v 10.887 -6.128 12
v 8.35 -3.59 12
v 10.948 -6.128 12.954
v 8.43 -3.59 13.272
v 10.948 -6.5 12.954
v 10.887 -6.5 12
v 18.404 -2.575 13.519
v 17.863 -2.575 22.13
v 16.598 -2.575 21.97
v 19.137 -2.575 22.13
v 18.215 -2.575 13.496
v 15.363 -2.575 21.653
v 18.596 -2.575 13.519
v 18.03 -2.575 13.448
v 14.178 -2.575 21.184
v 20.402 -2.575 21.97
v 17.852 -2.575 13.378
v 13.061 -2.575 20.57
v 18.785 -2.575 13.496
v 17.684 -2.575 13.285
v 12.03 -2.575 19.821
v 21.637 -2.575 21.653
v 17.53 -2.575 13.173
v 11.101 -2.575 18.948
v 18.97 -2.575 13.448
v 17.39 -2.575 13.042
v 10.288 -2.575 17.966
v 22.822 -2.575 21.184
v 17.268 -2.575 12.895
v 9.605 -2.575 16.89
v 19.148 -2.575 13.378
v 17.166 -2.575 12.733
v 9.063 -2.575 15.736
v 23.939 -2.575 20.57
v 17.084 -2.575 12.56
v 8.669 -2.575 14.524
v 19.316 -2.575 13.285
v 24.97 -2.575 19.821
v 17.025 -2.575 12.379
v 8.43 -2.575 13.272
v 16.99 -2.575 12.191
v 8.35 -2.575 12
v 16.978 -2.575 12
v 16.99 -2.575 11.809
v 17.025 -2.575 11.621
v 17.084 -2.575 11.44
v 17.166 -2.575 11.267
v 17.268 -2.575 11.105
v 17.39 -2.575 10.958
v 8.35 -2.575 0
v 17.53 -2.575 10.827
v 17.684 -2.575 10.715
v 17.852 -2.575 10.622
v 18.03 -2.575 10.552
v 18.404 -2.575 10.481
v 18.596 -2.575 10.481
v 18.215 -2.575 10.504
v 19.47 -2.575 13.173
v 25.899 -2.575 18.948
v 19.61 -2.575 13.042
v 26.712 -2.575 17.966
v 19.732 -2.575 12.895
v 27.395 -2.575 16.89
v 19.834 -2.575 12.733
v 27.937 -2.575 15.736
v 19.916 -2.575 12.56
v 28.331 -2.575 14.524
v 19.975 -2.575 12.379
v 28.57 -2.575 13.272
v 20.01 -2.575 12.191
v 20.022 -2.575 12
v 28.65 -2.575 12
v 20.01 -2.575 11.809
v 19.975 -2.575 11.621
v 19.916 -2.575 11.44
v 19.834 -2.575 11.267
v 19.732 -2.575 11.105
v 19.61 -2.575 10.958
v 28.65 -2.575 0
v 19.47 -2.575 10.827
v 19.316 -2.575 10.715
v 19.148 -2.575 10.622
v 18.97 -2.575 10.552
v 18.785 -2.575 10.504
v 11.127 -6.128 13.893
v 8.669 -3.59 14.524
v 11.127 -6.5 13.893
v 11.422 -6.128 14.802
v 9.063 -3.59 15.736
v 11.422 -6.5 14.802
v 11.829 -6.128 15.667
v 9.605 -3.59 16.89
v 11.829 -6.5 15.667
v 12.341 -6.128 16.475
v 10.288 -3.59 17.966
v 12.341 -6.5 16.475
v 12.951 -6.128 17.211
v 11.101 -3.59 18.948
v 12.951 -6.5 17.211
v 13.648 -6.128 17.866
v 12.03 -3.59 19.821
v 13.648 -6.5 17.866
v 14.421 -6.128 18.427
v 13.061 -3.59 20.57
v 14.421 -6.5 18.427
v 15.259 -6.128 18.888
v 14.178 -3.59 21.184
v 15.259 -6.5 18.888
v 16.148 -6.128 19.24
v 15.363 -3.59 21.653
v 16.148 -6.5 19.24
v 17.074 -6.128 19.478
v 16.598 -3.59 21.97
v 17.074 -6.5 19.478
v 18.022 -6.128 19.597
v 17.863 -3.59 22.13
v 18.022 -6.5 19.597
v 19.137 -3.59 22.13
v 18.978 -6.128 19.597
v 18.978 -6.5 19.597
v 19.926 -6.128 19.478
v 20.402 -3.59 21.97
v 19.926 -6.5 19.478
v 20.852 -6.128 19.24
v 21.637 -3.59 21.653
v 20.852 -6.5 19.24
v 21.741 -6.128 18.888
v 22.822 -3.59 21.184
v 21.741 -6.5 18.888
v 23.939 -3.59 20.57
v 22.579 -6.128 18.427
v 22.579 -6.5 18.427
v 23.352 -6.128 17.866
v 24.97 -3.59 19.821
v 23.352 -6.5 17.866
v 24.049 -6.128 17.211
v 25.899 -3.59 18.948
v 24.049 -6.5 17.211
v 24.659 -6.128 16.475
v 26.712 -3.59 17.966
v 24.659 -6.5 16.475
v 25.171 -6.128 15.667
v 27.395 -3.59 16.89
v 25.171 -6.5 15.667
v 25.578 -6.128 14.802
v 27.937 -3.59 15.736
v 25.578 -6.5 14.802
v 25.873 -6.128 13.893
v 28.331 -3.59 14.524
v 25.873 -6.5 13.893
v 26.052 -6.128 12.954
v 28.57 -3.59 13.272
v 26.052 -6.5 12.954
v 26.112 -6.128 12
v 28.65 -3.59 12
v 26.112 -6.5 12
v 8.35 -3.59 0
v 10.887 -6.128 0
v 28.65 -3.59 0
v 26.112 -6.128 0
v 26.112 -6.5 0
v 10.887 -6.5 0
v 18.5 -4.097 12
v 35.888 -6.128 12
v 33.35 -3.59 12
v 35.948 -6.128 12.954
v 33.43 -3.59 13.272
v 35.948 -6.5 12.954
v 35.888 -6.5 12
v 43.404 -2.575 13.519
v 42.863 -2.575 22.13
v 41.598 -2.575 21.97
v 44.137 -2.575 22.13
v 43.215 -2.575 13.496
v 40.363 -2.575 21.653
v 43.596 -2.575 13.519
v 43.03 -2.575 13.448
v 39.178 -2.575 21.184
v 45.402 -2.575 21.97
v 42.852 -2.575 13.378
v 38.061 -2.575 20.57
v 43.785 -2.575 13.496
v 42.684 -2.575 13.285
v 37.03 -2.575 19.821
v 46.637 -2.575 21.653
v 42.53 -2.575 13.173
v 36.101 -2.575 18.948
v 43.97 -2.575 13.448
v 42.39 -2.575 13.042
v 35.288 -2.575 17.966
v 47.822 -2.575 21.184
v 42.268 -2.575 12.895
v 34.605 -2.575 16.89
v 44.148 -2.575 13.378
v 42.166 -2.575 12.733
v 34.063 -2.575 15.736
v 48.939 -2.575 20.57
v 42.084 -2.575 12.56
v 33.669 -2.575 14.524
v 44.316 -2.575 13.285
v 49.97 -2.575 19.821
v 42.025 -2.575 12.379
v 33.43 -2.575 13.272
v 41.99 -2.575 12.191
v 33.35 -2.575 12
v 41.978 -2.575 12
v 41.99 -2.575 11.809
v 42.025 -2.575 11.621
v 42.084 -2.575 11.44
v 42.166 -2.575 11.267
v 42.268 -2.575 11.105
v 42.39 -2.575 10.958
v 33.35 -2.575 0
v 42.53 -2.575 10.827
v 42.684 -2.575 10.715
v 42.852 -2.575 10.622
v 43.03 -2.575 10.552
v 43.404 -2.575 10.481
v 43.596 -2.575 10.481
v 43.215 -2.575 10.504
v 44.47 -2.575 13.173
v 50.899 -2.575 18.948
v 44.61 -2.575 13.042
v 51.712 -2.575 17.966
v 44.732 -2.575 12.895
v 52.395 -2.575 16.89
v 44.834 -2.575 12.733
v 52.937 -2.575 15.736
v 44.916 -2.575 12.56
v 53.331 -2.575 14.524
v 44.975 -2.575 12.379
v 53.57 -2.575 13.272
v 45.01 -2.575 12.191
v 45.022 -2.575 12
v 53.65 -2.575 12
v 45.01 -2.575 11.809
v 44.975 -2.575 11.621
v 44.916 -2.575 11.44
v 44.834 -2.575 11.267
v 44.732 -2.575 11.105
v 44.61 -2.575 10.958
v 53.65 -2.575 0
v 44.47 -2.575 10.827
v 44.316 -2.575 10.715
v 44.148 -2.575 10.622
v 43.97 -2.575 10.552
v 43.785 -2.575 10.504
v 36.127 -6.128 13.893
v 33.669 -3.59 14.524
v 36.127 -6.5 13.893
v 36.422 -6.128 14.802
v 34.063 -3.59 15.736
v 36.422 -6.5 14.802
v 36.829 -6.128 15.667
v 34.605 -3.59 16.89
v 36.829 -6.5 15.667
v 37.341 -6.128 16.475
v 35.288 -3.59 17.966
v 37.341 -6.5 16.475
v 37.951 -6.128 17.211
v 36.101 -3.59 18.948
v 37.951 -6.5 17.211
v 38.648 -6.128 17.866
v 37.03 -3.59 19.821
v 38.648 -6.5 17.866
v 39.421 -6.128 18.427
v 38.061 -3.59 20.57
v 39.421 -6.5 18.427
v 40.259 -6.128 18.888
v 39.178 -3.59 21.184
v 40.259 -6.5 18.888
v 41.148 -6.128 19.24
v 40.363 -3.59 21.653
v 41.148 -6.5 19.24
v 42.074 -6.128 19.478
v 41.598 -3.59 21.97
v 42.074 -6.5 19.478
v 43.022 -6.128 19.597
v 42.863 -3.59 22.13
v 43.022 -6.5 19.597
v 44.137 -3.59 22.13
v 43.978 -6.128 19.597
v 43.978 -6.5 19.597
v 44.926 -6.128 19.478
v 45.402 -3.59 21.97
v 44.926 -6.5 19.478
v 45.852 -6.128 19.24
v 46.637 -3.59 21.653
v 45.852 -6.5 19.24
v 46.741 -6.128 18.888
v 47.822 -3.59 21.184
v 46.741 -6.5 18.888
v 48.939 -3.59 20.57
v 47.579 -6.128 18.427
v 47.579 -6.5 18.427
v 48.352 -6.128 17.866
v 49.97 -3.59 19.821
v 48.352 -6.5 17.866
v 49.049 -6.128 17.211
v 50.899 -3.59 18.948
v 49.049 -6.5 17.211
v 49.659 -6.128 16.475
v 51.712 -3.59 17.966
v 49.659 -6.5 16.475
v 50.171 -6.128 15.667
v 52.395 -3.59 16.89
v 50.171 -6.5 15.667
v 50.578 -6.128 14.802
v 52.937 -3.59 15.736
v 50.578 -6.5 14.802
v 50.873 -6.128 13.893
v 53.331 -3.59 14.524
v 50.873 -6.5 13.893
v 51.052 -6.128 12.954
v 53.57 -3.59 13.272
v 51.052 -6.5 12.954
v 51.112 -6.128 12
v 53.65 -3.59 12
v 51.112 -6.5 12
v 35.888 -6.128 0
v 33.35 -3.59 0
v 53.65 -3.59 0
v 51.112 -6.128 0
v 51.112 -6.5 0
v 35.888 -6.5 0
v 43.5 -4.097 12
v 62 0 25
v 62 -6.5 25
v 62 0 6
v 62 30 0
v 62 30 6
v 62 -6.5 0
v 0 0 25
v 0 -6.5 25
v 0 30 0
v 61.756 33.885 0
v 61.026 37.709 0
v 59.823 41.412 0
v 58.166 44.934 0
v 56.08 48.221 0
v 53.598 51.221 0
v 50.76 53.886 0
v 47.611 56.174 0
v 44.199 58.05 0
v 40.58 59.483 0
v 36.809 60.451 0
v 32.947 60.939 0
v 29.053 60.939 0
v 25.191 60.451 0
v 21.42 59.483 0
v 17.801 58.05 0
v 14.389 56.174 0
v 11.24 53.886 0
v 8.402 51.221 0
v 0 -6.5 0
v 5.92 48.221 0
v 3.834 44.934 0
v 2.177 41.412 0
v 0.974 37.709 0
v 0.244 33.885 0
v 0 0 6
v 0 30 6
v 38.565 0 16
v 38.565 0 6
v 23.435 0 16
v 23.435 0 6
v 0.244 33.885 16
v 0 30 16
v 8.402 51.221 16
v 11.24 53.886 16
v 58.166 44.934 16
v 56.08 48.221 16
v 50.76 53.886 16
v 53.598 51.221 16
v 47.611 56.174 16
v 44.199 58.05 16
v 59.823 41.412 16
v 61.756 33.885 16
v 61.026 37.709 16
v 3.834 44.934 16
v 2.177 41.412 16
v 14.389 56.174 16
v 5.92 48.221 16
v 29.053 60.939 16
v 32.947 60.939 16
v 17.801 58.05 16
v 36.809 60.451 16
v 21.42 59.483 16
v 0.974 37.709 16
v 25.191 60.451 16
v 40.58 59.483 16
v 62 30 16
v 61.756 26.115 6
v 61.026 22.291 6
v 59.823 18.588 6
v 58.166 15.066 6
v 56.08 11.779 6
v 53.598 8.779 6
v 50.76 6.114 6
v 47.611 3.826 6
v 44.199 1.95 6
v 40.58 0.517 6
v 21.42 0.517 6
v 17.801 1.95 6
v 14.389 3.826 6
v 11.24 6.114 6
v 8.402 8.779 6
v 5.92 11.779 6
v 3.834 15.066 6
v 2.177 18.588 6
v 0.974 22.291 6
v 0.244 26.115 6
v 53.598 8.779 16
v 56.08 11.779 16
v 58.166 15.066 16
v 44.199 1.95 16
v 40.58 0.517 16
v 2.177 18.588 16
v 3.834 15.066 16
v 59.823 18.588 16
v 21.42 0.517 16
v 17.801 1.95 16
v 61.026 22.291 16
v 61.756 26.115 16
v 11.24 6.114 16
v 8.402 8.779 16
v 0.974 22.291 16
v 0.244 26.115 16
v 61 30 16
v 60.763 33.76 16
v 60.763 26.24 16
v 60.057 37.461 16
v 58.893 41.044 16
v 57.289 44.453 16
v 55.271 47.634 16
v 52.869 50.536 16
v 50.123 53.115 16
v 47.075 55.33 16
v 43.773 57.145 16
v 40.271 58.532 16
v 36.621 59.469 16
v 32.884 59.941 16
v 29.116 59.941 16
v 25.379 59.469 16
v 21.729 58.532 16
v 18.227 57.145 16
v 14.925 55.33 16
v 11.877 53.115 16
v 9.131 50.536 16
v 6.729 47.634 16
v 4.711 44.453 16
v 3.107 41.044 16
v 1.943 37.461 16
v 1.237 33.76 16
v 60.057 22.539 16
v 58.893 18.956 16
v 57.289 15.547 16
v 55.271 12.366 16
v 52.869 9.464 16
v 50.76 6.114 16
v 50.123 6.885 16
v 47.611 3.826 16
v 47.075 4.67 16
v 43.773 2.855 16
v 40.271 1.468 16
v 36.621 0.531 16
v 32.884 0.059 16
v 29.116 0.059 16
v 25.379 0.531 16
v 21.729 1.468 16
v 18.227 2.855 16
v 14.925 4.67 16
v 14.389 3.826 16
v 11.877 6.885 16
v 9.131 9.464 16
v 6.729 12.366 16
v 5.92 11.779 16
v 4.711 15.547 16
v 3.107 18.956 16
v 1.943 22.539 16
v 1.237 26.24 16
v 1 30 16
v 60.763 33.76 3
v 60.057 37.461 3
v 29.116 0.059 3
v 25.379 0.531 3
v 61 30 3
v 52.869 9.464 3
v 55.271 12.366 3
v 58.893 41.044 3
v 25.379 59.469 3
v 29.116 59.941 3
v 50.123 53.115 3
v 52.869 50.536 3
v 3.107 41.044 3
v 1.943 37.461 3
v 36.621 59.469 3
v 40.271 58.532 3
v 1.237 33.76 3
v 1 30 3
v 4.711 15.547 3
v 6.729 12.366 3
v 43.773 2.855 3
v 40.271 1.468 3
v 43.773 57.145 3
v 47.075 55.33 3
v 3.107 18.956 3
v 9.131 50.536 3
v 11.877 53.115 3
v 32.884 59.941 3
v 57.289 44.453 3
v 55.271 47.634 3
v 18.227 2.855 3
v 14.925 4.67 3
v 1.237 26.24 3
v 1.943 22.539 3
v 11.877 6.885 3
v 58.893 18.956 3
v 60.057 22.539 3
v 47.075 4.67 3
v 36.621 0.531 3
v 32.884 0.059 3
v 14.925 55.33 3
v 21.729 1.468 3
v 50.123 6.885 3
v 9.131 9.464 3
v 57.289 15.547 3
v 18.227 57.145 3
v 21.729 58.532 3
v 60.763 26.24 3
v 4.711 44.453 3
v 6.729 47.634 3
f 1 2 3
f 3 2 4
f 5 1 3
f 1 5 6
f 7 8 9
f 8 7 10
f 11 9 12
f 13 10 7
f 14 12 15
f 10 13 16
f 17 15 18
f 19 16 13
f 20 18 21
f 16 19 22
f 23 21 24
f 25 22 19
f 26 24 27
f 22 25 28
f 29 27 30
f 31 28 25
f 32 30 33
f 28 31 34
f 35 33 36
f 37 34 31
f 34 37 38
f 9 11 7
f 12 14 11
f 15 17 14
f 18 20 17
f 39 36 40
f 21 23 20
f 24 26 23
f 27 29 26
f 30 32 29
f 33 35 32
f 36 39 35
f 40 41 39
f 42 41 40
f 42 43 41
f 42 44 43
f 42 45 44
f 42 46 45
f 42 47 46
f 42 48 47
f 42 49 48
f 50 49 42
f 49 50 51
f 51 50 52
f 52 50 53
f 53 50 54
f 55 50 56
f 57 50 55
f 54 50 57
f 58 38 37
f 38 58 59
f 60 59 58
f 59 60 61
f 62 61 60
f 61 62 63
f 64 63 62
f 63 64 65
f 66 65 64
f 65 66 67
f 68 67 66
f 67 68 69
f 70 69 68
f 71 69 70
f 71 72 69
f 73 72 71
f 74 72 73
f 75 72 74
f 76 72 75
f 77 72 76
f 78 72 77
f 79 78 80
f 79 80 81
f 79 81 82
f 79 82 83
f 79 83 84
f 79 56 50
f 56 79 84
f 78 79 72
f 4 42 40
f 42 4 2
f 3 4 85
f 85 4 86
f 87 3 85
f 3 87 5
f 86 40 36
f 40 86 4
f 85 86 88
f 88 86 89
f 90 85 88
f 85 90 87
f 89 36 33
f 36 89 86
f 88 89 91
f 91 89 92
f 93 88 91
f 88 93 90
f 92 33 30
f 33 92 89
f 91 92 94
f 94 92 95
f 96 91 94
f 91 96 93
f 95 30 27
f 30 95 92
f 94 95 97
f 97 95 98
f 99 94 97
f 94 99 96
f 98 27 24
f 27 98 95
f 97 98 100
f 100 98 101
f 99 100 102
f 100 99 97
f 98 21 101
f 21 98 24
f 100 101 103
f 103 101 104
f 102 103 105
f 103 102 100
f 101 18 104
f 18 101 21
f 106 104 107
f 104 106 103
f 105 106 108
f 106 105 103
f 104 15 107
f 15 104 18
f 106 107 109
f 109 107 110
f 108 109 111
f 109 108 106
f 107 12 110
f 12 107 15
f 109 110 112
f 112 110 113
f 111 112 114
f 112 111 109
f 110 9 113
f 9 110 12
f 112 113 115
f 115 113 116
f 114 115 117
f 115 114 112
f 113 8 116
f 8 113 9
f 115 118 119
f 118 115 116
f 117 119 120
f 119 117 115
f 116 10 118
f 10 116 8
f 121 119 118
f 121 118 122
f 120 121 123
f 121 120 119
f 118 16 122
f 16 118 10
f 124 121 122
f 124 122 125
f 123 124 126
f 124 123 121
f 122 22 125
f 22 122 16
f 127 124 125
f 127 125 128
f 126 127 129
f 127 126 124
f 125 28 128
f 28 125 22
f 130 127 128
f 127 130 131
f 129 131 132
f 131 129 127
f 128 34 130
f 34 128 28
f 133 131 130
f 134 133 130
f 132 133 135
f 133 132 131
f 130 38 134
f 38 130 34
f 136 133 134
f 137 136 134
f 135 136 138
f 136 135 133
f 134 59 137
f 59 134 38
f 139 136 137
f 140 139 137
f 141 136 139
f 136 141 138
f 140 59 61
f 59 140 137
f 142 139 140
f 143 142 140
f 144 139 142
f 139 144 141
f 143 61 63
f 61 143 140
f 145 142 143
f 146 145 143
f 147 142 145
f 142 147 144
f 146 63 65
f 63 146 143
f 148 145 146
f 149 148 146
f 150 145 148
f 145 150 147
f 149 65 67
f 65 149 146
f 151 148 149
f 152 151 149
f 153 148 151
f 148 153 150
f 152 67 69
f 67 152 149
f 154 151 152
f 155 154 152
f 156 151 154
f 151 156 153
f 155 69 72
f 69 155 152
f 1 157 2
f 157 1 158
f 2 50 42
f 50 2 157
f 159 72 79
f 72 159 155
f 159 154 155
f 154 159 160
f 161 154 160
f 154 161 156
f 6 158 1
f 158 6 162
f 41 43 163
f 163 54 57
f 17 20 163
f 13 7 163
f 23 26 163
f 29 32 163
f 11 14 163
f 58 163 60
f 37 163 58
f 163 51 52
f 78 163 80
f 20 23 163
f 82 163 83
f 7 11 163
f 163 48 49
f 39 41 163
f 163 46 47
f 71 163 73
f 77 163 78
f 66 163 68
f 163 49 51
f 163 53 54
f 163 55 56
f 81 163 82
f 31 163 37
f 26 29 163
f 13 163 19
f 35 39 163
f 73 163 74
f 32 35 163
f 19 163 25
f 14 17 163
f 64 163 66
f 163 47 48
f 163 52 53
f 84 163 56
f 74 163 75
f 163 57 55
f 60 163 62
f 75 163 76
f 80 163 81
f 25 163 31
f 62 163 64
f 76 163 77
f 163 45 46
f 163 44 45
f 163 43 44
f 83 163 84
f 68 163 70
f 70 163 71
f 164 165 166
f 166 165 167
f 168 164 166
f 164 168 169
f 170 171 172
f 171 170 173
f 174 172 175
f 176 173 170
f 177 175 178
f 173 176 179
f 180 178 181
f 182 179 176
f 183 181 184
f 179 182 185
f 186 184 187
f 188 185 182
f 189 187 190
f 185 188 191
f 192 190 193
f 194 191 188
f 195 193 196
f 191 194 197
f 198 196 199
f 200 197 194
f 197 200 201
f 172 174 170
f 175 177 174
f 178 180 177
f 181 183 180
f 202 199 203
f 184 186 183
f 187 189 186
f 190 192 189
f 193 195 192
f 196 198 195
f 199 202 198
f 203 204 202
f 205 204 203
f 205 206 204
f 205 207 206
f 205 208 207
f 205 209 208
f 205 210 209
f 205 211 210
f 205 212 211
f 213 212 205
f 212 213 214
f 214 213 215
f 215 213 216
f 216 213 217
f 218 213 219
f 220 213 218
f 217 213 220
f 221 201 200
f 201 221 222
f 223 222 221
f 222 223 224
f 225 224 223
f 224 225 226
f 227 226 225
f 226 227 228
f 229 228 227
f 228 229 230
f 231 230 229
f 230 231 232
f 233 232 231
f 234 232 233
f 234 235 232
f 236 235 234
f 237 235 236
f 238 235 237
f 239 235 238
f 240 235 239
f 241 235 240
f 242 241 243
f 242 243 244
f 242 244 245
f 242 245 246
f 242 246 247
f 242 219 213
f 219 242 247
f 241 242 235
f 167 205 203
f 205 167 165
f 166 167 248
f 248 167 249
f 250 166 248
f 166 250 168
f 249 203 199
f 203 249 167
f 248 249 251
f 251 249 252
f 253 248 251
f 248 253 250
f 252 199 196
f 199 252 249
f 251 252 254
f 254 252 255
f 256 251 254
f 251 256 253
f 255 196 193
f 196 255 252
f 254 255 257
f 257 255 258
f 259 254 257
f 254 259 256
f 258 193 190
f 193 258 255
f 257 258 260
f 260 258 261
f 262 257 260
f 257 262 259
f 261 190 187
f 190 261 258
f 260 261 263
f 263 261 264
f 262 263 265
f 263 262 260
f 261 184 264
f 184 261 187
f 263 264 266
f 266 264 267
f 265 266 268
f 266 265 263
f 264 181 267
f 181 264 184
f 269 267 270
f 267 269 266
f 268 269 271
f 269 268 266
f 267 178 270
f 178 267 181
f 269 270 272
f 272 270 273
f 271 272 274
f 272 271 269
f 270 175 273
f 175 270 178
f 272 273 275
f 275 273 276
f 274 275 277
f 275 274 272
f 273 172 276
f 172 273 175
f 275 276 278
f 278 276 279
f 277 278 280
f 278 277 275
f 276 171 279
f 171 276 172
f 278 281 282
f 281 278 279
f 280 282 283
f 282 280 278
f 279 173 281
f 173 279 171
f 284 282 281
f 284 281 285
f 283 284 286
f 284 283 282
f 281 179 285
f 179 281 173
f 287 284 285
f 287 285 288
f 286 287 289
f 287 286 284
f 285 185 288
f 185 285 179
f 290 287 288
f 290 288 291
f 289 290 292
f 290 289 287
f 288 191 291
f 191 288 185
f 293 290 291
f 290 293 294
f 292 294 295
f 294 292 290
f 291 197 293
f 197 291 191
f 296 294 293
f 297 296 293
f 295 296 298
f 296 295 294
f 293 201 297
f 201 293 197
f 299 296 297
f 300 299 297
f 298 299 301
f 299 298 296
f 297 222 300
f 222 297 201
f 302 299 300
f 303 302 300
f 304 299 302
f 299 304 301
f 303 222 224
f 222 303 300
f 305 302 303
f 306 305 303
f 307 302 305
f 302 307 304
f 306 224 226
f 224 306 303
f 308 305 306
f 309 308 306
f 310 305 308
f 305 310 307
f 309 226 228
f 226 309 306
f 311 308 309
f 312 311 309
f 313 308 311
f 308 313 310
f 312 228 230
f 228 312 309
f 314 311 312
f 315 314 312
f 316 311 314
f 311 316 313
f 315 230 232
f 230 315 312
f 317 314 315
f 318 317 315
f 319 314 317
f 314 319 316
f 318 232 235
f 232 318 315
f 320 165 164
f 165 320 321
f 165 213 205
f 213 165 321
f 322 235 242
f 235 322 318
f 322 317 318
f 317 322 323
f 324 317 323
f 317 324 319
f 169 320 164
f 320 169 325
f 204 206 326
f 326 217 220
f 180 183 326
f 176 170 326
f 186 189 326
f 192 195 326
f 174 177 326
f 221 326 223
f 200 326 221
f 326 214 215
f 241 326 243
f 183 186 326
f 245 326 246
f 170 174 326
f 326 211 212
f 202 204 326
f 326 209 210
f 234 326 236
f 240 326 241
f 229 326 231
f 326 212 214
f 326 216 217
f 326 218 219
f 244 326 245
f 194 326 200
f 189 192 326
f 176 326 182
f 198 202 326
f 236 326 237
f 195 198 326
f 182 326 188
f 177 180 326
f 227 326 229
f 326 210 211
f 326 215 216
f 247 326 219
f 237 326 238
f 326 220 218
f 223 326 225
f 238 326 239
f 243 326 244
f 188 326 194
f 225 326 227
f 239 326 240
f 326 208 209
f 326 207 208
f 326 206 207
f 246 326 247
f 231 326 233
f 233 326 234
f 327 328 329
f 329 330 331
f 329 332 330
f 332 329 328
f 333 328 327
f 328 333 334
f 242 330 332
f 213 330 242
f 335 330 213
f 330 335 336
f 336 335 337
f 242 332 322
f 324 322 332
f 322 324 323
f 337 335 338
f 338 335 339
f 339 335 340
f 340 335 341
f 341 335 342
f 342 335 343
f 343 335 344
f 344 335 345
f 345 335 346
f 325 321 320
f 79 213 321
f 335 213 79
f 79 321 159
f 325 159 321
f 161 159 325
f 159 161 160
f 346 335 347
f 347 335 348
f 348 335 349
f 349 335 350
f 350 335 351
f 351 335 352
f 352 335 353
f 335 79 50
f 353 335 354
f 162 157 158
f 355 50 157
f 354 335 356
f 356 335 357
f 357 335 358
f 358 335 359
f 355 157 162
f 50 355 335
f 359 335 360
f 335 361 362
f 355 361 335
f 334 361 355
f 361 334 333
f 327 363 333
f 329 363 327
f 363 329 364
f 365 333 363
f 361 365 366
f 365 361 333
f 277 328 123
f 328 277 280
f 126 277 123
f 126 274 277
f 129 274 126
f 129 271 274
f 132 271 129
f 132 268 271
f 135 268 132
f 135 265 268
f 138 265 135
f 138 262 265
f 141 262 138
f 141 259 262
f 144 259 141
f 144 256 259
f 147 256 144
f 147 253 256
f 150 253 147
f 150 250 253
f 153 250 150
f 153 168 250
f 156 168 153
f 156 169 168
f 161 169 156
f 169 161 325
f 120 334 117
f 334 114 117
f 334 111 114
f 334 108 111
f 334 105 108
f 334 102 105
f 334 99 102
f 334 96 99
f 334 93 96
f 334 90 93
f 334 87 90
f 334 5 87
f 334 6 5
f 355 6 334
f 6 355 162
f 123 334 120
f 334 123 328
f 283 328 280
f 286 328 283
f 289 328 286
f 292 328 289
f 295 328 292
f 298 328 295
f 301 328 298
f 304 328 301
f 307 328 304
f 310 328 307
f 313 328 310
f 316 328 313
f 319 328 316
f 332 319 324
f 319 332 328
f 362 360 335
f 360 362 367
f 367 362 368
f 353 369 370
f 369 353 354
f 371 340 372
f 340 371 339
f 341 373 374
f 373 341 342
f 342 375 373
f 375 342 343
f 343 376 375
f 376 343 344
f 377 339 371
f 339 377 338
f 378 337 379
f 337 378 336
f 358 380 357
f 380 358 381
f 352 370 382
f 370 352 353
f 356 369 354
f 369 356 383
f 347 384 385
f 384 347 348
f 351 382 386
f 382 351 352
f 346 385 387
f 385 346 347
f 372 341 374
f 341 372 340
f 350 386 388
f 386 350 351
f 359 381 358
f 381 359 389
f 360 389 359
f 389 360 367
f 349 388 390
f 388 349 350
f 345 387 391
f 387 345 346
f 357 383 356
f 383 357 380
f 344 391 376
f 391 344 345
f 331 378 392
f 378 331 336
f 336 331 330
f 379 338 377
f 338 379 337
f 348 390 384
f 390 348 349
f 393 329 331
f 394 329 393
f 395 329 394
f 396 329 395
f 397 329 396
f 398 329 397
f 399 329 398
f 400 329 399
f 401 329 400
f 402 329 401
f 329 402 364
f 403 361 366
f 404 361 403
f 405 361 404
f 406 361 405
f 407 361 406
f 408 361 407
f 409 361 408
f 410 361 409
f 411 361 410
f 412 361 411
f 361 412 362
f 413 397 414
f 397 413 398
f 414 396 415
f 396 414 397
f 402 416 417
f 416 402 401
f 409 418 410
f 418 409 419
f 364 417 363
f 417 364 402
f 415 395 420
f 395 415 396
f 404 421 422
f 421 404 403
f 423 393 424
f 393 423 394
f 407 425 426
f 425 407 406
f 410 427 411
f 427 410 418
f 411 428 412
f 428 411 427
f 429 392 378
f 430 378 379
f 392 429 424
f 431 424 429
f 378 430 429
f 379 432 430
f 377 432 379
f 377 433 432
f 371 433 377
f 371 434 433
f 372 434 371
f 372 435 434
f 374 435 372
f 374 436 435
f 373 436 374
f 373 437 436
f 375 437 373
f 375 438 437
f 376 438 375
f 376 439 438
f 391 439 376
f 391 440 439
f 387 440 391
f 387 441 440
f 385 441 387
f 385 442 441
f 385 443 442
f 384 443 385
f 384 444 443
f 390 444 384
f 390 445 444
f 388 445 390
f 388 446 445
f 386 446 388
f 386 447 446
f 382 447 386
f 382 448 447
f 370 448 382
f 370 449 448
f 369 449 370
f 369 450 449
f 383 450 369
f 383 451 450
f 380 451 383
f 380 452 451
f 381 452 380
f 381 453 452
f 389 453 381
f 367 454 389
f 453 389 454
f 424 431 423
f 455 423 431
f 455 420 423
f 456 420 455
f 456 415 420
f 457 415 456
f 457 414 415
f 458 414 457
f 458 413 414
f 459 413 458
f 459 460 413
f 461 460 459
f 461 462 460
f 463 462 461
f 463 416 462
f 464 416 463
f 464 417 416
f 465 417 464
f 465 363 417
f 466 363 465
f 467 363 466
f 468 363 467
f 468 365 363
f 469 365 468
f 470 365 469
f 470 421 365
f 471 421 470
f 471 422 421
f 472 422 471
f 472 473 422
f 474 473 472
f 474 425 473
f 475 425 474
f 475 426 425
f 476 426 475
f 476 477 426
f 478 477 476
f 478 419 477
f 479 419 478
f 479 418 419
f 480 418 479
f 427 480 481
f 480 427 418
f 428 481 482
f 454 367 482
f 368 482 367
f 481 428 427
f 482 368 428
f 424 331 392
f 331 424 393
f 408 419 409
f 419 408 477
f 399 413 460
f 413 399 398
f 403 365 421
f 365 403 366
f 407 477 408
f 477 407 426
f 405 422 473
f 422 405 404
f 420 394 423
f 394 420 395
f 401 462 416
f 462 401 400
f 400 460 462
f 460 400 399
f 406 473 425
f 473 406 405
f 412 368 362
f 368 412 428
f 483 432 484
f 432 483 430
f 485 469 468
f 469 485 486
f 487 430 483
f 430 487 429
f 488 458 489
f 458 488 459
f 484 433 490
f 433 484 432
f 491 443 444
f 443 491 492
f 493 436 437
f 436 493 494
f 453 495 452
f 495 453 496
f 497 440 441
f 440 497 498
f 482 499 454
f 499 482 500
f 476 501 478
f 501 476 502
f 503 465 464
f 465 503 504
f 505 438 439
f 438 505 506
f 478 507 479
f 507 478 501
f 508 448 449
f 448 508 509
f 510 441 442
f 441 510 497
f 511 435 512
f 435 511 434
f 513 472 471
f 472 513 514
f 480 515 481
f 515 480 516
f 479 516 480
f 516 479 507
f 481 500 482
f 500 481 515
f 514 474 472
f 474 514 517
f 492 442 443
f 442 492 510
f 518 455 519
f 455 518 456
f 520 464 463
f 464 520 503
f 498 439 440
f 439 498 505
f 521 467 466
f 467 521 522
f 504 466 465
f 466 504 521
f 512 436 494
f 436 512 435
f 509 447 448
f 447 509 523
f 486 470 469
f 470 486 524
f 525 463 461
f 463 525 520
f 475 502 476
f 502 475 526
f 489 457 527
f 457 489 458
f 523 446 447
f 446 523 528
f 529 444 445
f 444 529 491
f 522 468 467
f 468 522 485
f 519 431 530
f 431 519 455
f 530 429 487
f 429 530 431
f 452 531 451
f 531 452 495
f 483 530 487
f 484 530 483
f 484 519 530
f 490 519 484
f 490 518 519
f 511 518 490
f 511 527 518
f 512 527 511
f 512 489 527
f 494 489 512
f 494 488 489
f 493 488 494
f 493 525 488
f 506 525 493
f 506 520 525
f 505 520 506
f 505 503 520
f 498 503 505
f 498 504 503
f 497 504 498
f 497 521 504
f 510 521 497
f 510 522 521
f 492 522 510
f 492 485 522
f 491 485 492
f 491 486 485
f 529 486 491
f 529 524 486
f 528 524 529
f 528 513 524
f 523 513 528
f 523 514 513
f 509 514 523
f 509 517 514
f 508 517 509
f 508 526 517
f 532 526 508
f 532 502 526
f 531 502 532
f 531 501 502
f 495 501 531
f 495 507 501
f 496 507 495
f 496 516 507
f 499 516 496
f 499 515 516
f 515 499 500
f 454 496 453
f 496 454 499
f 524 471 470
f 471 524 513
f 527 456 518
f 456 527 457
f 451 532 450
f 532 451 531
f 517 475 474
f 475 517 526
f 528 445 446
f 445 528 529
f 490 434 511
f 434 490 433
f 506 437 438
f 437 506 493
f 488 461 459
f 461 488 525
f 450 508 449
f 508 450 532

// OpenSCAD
/*Created by Andy Levesque
Credit to @David D on Printables and Jonathan at Keep Making for Multiconnect and Multiboard, respectively
Licensed Creative Commons 4.0 Attribution Non-Commercial Sharable with Attribution
*/

/*[Parameters]*/
//diameter (in mm) of the item you wish to insert (this becomes the internal diameter)
itemDiameter = 60;
//thickness (in mm) of the wall surrounding the item
rimThickness = 1;
//Thickness (in mm) of the base underneath the item you are holding
baseThickness = 3;
//Additional thickness of the area between the item holding and the backer.
shelfSupportHeight = 3;
//Additional height (in mm) of the rim protruding upward to hold the item
rimHeight = 10;
//Additional Backer Height (in mm) in case you prefer additional support for something heavy
additionalBackerHeight = 0;

/* [Slot Customization] */
//Distance between Multiconnect slots on the back (25mm is standard for MultiBoard)
distanceBetweenSlots = 25;
//QuickRelease removes the small indent in the top of the slots that lock the part into place
slotQuickRelease = false;
//Dimple scale tweaks the size of the dimple in the slot for printers that need a larger dimple to print correctly
dimpleScale = 1; //[0.5:.05:1.5]

/*[Hidden]*/
totalWidth = itemDiameter + rimThickness*2;
totalHeight = max(baseThickness+shelfSupportHeight,25);

//Thickness of the back of the item (default in 6.5mm). Changes are untested. 
backThickness = 6.5; //.1
//Scale of slots in the back (1.015 scale is default per MultiConnect specs)
slotTolerance = 1.015; //[1.0:0.005:1.025]
//slot count calculates how many slots can fit on the back. Based on internal width for buffer.
slotCount = floor(max(distanceBetweenSlots,totalWidth)/distanceBetweenSlots);
echo(str("Slot Count: ",slotCount));
backWidth = max(distanceBetweenSlots,totalWidth);


//start build
back(backWidth = backWidth, backHeight = totalHeight+additionalBackerHeight, backThickness = backThickness);

difference() {
    //itemwalls
    union() {
        hull(){
            translate(v = [totalWidth/2,itemDiameter/2,0]) 
                //outer circle
                linear_extrude(height = shelfSupportHeight+baseThickness) 
                        circle(r = itemDiameter/2+rimThickness, $fn=50);
                //wide back for hull operation
                linear_extrude(height = shelfSupportHeight+baseThickness) 
                        square(size = [totalWidth,1]);
            }
        //thin holding wall
        translate(v = [totalWidth/2,itemDiameter/2,shelfSupportHeight+baseThickness]) 
            linear_extrude(height = rimHeight) 
                circle(r = itemDiameter/2+rimThickness, $fn=50);
    }
    //itemDiameter (i.e., delete tool)
    color(c = "red") translate(v = [totalWidth/2,itemDiameter/2,baseThickness]) linear_extrude(height = shelfSupportHeight+rimHeight+1) circle(r = itemDiameter/2, , $fn=50);
}
//Slotted back
module back(backWidth, backHeight, backThickness)
{

    difference() {
        translate(v = [0,-backThickness,0]) cube(size = [backWidth,backThickness,backHeight]);
        //Loop through slots and center on the item
        //Note: I kept doing math until it looked right. It's possible this can be simplified.
        for (slotNum = [0:1:slotCount-1]) {
            translate(v = [distanceBetweenSlots/2+(backWidth/distanceBetweenSlots-slotCount)*distanceBetweenSlots/2+slotNum*distanceBetweenSlots,-2.575,backHeight-13]) {
                color(c = "red")  slotTool(backHeight);
            }
        }
    }
}
//Create Slot Tool
module slotTool(productHeight) {
    //translate(v = [0,-0.075,0]) //removed for redundancy
    scale(v = slotTolerance) //scale for 0.15mm tolerance per Multiconnect design specs
    difference() {
        union() {
            //round top
            rotate(a = [90,0,0,]) 
                rotate_extrude($fn=50) 
                    polygon(points = [[0,0],[10,0],[10,1],[7.5,3.5],[7.5,4],[0,4]]);
            //long slot
            translate(v = [0,0,0]) 
                rotate(a = [180,0,0]) 
                linear_extrude(height = productHeight+1) 
                    union(){
                        polygon(points = [[0,0],[10,0],[10,1],[7.5,3.5],[7.5,4],[0,4]]);
                        mirror([1,0,0])
                            polygon(points = [[0,0],[10,0],[10,1],[7.5,3.5],[7.5,4],[0,4]]);
                    }
        }
        //dimple
        if (slotQuickRelease == false)
            scale(v = dimpleScale) 
            rotate(a = [90,0,0,]) 
                rotate_extrude($fn=50) 
                    polygon(points = [[0,0],[0,1.5],[1.5,0]]);
    }
}
